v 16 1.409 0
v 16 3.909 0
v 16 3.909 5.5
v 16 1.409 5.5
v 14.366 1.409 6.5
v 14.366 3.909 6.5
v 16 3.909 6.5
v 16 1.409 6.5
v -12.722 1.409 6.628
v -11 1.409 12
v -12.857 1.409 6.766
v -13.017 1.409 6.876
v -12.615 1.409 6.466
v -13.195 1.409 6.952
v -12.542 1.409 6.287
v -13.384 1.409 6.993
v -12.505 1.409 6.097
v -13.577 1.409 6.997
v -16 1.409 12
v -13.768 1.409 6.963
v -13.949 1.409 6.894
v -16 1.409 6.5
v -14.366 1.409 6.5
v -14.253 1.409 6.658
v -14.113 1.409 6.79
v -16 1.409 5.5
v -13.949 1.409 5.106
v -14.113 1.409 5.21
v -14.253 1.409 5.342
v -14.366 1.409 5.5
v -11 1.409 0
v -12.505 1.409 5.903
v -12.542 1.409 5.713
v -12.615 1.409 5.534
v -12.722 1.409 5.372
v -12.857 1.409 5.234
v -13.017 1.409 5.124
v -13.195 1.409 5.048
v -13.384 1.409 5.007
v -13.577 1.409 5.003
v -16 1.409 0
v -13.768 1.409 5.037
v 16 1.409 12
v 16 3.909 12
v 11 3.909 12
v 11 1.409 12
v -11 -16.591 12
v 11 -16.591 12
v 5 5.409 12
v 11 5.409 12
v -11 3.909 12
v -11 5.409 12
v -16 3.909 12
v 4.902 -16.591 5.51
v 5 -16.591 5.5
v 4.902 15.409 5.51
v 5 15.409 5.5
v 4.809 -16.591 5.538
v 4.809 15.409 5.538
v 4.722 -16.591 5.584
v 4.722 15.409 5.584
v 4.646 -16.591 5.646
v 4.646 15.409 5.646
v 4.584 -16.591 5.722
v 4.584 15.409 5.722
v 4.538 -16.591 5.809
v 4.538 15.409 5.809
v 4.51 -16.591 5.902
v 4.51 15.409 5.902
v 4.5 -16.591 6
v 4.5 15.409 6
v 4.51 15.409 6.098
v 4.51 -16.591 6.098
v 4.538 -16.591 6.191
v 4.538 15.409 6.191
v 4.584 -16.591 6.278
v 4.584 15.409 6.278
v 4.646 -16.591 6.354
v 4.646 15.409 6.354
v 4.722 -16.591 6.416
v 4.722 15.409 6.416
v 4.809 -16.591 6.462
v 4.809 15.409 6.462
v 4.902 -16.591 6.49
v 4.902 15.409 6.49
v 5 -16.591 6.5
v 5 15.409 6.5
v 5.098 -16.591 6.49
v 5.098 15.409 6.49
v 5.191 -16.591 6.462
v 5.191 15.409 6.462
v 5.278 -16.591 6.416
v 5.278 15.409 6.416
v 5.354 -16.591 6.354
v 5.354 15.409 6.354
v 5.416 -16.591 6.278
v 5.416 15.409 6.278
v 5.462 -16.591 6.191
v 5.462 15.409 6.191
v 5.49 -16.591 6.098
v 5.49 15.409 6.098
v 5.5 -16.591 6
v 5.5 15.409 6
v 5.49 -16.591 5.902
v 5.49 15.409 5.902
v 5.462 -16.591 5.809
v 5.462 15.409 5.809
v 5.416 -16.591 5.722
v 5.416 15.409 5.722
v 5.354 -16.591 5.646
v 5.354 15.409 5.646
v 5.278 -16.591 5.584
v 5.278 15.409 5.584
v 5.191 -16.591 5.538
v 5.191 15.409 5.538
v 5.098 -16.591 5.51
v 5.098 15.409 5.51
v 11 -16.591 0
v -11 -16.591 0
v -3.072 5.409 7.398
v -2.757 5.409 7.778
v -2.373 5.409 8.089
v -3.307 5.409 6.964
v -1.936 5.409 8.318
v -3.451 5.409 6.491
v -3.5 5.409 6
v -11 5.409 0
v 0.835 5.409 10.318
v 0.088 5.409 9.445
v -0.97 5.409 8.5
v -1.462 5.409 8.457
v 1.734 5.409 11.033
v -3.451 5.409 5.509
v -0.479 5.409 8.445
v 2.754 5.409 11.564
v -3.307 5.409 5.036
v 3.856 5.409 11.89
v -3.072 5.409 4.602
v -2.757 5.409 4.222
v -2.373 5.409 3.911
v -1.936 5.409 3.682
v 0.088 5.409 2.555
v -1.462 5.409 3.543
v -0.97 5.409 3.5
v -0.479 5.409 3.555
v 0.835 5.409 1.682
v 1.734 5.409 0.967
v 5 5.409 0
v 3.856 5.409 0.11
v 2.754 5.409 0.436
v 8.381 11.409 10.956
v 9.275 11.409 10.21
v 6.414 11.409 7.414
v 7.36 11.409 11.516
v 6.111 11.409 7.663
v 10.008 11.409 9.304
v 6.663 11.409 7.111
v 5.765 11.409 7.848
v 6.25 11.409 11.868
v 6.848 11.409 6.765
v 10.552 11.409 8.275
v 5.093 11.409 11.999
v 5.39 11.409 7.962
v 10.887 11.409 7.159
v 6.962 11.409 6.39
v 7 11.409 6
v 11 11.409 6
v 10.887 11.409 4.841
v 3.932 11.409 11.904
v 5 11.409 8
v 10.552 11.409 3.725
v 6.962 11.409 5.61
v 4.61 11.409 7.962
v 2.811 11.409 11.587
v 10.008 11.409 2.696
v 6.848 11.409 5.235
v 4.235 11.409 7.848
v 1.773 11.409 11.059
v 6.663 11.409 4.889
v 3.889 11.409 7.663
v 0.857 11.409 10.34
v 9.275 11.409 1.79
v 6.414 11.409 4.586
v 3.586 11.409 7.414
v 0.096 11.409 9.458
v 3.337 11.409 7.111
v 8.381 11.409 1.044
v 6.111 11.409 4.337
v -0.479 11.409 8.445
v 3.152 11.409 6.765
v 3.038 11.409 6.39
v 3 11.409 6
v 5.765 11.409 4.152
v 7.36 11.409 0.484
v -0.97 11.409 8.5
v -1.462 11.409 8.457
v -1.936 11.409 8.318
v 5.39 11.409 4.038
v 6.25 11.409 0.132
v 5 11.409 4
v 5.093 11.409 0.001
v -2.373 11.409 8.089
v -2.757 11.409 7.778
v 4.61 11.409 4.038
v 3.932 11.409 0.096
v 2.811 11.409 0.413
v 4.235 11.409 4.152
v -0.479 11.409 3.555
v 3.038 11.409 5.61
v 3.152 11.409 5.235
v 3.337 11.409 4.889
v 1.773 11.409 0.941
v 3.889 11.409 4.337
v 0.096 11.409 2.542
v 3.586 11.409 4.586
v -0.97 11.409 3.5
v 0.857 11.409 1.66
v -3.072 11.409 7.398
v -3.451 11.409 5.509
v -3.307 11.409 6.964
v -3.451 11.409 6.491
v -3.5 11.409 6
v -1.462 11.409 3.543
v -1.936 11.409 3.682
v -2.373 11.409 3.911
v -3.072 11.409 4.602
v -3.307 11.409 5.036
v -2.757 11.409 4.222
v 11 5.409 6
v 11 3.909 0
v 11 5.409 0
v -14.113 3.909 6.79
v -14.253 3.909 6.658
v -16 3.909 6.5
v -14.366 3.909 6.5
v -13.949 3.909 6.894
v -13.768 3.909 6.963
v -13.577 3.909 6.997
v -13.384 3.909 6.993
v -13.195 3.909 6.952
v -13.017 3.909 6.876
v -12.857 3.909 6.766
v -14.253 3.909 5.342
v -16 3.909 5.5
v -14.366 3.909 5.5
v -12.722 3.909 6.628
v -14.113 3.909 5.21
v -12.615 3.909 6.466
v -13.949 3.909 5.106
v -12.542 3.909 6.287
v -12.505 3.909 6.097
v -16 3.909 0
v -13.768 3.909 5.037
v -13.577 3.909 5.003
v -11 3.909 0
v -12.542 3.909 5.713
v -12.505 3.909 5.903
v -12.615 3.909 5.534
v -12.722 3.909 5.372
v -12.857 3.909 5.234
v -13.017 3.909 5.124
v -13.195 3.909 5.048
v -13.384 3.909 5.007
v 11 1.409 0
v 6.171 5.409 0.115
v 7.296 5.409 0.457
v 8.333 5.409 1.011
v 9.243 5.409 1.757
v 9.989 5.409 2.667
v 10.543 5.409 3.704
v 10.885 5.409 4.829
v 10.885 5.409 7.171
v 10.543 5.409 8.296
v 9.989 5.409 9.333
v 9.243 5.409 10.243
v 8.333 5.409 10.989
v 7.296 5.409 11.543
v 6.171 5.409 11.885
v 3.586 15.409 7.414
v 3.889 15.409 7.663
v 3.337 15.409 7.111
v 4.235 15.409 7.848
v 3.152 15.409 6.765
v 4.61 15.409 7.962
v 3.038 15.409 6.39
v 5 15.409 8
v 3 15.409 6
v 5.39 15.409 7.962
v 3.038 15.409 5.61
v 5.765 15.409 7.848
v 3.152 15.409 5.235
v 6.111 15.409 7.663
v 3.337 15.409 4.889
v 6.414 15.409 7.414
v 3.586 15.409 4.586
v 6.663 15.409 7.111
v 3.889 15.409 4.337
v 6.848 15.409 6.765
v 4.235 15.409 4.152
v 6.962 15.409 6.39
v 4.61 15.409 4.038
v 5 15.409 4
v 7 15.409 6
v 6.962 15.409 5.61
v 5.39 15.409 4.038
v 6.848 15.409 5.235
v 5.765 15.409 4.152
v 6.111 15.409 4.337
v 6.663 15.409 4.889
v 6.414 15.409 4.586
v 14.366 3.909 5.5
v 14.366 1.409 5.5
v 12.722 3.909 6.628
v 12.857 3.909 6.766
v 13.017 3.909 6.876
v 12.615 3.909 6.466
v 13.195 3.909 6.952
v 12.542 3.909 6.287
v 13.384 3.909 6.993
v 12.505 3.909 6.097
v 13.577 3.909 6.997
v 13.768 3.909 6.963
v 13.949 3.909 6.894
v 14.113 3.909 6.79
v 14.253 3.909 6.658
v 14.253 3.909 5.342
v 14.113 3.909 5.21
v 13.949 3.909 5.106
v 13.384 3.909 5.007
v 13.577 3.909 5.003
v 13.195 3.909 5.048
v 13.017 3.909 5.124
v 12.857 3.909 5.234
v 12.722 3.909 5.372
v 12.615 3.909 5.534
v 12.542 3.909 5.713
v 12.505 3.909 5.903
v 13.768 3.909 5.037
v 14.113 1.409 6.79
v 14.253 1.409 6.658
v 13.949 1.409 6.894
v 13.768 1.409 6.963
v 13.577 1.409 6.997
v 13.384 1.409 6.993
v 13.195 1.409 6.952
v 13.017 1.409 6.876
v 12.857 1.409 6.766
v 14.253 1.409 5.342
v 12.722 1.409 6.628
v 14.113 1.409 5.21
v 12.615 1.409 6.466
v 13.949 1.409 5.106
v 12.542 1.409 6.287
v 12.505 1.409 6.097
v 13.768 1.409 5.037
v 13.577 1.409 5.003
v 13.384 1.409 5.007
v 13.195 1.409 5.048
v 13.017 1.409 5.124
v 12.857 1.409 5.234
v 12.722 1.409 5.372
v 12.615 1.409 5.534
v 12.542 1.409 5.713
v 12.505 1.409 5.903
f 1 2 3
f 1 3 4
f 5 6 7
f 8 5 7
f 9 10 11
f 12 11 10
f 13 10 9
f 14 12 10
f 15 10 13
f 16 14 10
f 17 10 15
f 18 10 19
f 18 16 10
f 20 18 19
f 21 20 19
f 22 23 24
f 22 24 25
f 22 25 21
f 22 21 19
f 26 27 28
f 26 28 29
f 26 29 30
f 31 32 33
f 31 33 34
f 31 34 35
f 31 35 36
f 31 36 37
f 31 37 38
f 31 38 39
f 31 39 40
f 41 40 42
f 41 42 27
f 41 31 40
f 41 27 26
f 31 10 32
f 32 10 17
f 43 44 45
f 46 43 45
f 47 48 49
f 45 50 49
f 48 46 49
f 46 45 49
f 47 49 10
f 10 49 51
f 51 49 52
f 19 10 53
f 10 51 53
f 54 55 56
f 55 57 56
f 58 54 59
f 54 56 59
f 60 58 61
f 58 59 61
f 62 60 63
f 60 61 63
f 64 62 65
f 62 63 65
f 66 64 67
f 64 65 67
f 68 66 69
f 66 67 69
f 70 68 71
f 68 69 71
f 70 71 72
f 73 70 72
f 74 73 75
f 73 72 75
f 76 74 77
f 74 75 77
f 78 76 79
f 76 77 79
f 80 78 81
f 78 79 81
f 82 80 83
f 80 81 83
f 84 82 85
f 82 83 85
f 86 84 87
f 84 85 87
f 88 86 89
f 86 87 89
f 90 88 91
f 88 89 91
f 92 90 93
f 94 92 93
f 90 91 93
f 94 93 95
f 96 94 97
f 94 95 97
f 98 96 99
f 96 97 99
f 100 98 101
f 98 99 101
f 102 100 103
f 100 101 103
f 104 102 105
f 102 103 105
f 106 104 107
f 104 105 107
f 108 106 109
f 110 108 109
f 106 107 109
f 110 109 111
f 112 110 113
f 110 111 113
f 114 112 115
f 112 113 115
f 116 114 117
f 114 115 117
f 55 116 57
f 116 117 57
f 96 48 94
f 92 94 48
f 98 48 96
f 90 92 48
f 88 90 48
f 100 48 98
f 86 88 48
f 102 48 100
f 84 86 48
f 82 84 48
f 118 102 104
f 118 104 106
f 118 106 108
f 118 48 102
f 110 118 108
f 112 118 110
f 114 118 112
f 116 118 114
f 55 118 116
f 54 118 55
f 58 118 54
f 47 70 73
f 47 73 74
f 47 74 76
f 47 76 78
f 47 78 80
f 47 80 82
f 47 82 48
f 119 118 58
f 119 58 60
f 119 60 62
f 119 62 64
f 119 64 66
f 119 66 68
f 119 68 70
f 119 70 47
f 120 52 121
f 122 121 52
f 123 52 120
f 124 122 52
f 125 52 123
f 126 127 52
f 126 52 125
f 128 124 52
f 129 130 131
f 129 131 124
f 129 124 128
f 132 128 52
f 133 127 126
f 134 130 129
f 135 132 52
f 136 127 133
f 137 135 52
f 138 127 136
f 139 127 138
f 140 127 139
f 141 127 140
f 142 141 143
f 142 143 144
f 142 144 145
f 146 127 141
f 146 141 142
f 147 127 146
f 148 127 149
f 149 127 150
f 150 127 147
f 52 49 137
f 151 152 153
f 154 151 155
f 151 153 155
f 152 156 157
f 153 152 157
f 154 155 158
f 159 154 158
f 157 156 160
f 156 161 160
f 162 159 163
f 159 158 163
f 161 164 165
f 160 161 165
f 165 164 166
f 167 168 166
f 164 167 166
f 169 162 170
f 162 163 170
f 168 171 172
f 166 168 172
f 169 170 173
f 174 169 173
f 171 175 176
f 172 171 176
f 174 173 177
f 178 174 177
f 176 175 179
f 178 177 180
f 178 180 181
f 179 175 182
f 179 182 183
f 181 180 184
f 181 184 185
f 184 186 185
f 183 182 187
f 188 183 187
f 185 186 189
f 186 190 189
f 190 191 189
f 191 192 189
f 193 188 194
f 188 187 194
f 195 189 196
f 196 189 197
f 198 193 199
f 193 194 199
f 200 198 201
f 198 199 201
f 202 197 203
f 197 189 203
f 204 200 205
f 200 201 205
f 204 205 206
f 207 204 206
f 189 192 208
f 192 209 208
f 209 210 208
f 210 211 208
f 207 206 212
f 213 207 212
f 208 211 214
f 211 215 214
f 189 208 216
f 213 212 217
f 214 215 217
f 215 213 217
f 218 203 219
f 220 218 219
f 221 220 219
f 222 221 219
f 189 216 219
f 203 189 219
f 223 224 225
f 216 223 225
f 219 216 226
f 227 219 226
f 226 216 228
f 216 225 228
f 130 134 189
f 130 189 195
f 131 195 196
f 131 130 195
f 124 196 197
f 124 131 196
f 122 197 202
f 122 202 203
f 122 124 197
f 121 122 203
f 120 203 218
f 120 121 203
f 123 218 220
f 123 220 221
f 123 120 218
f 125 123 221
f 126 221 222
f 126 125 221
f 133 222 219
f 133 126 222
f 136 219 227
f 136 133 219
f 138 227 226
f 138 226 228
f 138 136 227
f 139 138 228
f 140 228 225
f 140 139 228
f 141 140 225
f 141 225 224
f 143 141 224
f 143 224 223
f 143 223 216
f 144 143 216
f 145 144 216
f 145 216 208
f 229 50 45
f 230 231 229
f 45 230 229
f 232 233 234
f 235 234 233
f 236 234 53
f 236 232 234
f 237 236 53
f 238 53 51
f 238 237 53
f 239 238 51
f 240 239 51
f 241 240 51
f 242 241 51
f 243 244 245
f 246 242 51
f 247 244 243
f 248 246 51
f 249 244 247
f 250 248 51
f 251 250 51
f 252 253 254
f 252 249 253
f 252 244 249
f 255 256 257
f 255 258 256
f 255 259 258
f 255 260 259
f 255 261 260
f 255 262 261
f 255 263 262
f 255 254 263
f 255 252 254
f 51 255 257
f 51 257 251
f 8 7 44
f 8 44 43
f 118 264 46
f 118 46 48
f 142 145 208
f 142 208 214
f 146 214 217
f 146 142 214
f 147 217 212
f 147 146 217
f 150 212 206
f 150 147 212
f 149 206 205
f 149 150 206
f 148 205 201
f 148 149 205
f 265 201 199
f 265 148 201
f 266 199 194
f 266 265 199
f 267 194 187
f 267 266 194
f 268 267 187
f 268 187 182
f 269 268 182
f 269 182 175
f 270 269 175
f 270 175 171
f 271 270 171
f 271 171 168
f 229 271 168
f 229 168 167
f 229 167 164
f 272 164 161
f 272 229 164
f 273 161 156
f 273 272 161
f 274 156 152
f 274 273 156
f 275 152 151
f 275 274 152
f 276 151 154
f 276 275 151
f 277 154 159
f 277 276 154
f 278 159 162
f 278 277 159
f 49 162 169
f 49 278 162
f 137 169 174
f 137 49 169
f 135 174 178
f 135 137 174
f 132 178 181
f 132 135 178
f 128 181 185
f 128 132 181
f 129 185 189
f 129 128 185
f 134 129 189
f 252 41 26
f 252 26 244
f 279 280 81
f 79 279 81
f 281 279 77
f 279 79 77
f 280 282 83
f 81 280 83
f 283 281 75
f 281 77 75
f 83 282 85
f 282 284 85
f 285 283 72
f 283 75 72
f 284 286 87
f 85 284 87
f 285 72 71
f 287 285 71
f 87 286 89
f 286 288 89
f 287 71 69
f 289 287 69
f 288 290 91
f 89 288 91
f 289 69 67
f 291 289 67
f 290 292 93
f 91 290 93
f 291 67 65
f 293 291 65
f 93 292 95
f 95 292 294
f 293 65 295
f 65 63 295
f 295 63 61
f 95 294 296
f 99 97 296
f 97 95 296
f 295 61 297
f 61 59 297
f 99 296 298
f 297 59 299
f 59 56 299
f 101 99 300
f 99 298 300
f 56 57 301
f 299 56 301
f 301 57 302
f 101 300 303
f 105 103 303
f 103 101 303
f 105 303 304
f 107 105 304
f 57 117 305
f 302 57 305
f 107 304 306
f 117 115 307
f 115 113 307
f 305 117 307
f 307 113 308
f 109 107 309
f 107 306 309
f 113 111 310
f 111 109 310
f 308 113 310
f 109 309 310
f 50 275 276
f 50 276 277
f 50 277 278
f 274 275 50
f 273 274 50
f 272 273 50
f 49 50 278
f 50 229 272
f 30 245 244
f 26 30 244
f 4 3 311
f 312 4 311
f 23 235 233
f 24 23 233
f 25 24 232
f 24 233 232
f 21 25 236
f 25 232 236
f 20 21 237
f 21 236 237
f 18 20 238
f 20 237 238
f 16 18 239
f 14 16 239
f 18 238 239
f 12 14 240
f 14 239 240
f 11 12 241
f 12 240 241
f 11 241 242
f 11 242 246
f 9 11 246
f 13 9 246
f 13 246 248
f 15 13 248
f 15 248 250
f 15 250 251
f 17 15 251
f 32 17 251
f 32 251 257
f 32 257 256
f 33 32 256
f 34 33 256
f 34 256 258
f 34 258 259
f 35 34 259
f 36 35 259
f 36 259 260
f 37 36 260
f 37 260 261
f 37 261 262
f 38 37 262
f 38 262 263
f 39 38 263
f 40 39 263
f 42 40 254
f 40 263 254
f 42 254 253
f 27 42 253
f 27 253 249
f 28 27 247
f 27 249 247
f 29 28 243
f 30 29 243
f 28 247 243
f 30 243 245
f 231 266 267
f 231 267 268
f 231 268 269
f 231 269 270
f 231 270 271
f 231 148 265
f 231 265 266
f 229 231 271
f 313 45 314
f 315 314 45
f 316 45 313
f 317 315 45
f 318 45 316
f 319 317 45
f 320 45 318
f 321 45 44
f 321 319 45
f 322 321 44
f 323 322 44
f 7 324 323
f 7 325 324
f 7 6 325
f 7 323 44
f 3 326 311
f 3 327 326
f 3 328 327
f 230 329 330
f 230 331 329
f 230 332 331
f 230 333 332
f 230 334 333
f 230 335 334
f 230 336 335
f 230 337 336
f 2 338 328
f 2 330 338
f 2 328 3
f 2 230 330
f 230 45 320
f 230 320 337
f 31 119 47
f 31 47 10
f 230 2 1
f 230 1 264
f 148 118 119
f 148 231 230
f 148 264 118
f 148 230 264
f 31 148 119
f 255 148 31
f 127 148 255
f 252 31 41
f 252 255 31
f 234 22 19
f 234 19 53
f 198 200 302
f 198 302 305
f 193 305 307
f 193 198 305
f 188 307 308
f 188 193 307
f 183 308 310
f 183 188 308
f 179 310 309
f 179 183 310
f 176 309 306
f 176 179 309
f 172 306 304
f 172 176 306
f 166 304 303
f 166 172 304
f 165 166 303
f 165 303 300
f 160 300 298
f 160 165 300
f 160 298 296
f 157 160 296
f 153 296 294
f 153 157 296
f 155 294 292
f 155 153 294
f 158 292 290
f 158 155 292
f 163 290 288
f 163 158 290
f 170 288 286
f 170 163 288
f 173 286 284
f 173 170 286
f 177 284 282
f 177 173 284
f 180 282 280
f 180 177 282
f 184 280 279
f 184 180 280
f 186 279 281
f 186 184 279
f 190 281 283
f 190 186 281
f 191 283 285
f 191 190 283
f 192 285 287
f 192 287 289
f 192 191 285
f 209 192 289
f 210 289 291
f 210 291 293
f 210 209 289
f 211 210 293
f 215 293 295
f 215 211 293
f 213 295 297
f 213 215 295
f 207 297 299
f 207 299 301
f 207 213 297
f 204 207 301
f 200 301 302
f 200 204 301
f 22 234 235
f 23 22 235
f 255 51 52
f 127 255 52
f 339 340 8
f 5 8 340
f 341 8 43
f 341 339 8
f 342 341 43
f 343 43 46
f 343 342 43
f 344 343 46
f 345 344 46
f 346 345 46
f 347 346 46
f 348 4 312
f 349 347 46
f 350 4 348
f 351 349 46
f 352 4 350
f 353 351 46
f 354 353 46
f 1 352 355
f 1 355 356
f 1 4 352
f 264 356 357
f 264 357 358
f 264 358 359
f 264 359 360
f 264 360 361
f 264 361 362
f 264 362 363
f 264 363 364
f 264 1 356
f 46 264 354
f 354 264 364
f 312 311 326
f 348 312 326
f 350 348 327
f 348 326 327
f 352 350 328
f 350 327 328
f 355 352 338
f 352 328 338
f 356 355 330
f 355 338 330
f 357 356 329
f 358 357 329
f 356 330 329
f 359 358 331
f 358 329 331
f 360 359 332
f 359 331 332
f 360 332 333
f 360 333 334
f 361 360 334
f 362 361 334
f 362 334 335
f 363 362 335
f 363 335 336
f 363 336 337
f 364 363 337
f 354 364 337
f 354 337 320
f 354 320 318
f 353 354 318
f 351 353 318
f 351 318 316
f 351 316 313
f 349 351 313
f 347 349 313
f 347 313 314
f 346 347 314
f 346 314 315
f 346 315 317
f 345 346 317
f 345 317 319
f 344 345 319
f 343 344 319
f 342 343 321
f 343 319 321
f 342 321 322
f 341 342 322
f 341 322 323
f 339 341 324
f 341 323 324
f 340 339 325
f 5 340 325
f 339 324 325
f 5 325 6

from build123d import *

# Parameters (mm, degrees)
EXTRUDE_5_DEPTH     = 12
EXTRUDE_6_DEPTH     = 6
SKETCH_11_R         = 2
SKETCH_11_R_2       = 0.5
EXTRUDE_7_DEPTH     = 4
CUT_EXTRUDE_4_DEPTH = 3
SKETCH_15_R         = 0.5
CUT_EXTRUDE_5_DEPTH = 38.735924528


with BuildPart() as part:
    # 草图9 → 凸台-拉伸5 (new body)
    with BuildSketch(Plane.XY):
        Polygon((11, -16.590909091), (-11, -16.590909091), (-11, 1.409090909), (-16, 1.409090909), (-16, 3.909090909), (-11, 3.909090909), (-11, 5.409090909), (11, 5.409090909), (11, 3.909090909), (16, 3.909090909), (16, 1.409090909), (11, 1.409090909), align=None)
    extrude(amount=EXTRUDE_5_DEPTH)

    # 草图10 → 凸台-拉伸6 (add)
    with BuildSketch(Plane(origin=(0, 5.409090909, 0), x_dir=(-1, 0, 0), z_dir=(0, -1, 0))):
        with BuildLine():
            ThreePointArc((0.479166667, -3.554855293), (-11, -6), (0.479166667, -8.445144707))
            ThreePointArc((0.479166667, -8.445144707), (3.5, -6), (0.479166667, -3.554855293))
        make_face()
    extrude(amount=-EXTRUDE_6_DEPTH)

    # 草图11 → 凸台-拉伸7 (add)
    with BuildSketch(Plane(origin=(0, 11.409090909, 0), x_dir=(-1, 0, 0), z_dir=(0, -1, 0))):
        with Locations(Location((-5, -6, 0), (0, 0, 90))):
            Circle(SKETCH_11_R)
        with Locations(Location((-5, -6, 0), (0, 0, 90))):
            Circle(SKETCH_11_R_2, mode=Mode.SUBTRACT)
    extrude(amount=-EXTRUDE_7_DEPTH)

    # 草图13 → 切除-拉伸4 (cut)
    with BuildSketch(Plane(origin=(0, 3.909090909, 0), x_dir=(-1, 0, 0), z_dir=(0, -1, 0))):
        with BuildLine():
            Line((-14.366025404, -6.5), (-16, -6.5))
            Line((-16, -6.5), (-16, -5.5))
            Line((-16, -5.5), (-14.366025404, -5.5))
            ThreePointArc((-14.366025404, -5.5), (-12.5, -6), (-14.366025404, -6.5))
        make_face()
        with BuildLine():
            Line((14.366025404, -5.5), (16, -5.5))
            Line((16, -5.5), (16, -6.5))
            Line((16, -6.5), (14.366025404, -6.5))
            ThreePointArc((14.366025404, -6.5), (12.5, -6), (14.366025404, -5.5))
        make_face()
    extrude(amount=CUT_EXTRUDE_4_DEPTH, mode=Mode.SUBTRACT)

    # 草图15 → 切除-拉伸5 (cut, through all)
    with BuildSketch(Plane(origin=(0, 15.409090909, 0), x_dir=(1, 0, 0), z_dir=(0, 1, 0))):
        with Locations(Location((5, -6, 0), (0, 0, 90))):
            Circle(SKETCH_15_R)
    extrude(amount=-CUT_EXTRUDE_5_DEPTH, mode=Mode.SUBTRACT)


solid = part.part
